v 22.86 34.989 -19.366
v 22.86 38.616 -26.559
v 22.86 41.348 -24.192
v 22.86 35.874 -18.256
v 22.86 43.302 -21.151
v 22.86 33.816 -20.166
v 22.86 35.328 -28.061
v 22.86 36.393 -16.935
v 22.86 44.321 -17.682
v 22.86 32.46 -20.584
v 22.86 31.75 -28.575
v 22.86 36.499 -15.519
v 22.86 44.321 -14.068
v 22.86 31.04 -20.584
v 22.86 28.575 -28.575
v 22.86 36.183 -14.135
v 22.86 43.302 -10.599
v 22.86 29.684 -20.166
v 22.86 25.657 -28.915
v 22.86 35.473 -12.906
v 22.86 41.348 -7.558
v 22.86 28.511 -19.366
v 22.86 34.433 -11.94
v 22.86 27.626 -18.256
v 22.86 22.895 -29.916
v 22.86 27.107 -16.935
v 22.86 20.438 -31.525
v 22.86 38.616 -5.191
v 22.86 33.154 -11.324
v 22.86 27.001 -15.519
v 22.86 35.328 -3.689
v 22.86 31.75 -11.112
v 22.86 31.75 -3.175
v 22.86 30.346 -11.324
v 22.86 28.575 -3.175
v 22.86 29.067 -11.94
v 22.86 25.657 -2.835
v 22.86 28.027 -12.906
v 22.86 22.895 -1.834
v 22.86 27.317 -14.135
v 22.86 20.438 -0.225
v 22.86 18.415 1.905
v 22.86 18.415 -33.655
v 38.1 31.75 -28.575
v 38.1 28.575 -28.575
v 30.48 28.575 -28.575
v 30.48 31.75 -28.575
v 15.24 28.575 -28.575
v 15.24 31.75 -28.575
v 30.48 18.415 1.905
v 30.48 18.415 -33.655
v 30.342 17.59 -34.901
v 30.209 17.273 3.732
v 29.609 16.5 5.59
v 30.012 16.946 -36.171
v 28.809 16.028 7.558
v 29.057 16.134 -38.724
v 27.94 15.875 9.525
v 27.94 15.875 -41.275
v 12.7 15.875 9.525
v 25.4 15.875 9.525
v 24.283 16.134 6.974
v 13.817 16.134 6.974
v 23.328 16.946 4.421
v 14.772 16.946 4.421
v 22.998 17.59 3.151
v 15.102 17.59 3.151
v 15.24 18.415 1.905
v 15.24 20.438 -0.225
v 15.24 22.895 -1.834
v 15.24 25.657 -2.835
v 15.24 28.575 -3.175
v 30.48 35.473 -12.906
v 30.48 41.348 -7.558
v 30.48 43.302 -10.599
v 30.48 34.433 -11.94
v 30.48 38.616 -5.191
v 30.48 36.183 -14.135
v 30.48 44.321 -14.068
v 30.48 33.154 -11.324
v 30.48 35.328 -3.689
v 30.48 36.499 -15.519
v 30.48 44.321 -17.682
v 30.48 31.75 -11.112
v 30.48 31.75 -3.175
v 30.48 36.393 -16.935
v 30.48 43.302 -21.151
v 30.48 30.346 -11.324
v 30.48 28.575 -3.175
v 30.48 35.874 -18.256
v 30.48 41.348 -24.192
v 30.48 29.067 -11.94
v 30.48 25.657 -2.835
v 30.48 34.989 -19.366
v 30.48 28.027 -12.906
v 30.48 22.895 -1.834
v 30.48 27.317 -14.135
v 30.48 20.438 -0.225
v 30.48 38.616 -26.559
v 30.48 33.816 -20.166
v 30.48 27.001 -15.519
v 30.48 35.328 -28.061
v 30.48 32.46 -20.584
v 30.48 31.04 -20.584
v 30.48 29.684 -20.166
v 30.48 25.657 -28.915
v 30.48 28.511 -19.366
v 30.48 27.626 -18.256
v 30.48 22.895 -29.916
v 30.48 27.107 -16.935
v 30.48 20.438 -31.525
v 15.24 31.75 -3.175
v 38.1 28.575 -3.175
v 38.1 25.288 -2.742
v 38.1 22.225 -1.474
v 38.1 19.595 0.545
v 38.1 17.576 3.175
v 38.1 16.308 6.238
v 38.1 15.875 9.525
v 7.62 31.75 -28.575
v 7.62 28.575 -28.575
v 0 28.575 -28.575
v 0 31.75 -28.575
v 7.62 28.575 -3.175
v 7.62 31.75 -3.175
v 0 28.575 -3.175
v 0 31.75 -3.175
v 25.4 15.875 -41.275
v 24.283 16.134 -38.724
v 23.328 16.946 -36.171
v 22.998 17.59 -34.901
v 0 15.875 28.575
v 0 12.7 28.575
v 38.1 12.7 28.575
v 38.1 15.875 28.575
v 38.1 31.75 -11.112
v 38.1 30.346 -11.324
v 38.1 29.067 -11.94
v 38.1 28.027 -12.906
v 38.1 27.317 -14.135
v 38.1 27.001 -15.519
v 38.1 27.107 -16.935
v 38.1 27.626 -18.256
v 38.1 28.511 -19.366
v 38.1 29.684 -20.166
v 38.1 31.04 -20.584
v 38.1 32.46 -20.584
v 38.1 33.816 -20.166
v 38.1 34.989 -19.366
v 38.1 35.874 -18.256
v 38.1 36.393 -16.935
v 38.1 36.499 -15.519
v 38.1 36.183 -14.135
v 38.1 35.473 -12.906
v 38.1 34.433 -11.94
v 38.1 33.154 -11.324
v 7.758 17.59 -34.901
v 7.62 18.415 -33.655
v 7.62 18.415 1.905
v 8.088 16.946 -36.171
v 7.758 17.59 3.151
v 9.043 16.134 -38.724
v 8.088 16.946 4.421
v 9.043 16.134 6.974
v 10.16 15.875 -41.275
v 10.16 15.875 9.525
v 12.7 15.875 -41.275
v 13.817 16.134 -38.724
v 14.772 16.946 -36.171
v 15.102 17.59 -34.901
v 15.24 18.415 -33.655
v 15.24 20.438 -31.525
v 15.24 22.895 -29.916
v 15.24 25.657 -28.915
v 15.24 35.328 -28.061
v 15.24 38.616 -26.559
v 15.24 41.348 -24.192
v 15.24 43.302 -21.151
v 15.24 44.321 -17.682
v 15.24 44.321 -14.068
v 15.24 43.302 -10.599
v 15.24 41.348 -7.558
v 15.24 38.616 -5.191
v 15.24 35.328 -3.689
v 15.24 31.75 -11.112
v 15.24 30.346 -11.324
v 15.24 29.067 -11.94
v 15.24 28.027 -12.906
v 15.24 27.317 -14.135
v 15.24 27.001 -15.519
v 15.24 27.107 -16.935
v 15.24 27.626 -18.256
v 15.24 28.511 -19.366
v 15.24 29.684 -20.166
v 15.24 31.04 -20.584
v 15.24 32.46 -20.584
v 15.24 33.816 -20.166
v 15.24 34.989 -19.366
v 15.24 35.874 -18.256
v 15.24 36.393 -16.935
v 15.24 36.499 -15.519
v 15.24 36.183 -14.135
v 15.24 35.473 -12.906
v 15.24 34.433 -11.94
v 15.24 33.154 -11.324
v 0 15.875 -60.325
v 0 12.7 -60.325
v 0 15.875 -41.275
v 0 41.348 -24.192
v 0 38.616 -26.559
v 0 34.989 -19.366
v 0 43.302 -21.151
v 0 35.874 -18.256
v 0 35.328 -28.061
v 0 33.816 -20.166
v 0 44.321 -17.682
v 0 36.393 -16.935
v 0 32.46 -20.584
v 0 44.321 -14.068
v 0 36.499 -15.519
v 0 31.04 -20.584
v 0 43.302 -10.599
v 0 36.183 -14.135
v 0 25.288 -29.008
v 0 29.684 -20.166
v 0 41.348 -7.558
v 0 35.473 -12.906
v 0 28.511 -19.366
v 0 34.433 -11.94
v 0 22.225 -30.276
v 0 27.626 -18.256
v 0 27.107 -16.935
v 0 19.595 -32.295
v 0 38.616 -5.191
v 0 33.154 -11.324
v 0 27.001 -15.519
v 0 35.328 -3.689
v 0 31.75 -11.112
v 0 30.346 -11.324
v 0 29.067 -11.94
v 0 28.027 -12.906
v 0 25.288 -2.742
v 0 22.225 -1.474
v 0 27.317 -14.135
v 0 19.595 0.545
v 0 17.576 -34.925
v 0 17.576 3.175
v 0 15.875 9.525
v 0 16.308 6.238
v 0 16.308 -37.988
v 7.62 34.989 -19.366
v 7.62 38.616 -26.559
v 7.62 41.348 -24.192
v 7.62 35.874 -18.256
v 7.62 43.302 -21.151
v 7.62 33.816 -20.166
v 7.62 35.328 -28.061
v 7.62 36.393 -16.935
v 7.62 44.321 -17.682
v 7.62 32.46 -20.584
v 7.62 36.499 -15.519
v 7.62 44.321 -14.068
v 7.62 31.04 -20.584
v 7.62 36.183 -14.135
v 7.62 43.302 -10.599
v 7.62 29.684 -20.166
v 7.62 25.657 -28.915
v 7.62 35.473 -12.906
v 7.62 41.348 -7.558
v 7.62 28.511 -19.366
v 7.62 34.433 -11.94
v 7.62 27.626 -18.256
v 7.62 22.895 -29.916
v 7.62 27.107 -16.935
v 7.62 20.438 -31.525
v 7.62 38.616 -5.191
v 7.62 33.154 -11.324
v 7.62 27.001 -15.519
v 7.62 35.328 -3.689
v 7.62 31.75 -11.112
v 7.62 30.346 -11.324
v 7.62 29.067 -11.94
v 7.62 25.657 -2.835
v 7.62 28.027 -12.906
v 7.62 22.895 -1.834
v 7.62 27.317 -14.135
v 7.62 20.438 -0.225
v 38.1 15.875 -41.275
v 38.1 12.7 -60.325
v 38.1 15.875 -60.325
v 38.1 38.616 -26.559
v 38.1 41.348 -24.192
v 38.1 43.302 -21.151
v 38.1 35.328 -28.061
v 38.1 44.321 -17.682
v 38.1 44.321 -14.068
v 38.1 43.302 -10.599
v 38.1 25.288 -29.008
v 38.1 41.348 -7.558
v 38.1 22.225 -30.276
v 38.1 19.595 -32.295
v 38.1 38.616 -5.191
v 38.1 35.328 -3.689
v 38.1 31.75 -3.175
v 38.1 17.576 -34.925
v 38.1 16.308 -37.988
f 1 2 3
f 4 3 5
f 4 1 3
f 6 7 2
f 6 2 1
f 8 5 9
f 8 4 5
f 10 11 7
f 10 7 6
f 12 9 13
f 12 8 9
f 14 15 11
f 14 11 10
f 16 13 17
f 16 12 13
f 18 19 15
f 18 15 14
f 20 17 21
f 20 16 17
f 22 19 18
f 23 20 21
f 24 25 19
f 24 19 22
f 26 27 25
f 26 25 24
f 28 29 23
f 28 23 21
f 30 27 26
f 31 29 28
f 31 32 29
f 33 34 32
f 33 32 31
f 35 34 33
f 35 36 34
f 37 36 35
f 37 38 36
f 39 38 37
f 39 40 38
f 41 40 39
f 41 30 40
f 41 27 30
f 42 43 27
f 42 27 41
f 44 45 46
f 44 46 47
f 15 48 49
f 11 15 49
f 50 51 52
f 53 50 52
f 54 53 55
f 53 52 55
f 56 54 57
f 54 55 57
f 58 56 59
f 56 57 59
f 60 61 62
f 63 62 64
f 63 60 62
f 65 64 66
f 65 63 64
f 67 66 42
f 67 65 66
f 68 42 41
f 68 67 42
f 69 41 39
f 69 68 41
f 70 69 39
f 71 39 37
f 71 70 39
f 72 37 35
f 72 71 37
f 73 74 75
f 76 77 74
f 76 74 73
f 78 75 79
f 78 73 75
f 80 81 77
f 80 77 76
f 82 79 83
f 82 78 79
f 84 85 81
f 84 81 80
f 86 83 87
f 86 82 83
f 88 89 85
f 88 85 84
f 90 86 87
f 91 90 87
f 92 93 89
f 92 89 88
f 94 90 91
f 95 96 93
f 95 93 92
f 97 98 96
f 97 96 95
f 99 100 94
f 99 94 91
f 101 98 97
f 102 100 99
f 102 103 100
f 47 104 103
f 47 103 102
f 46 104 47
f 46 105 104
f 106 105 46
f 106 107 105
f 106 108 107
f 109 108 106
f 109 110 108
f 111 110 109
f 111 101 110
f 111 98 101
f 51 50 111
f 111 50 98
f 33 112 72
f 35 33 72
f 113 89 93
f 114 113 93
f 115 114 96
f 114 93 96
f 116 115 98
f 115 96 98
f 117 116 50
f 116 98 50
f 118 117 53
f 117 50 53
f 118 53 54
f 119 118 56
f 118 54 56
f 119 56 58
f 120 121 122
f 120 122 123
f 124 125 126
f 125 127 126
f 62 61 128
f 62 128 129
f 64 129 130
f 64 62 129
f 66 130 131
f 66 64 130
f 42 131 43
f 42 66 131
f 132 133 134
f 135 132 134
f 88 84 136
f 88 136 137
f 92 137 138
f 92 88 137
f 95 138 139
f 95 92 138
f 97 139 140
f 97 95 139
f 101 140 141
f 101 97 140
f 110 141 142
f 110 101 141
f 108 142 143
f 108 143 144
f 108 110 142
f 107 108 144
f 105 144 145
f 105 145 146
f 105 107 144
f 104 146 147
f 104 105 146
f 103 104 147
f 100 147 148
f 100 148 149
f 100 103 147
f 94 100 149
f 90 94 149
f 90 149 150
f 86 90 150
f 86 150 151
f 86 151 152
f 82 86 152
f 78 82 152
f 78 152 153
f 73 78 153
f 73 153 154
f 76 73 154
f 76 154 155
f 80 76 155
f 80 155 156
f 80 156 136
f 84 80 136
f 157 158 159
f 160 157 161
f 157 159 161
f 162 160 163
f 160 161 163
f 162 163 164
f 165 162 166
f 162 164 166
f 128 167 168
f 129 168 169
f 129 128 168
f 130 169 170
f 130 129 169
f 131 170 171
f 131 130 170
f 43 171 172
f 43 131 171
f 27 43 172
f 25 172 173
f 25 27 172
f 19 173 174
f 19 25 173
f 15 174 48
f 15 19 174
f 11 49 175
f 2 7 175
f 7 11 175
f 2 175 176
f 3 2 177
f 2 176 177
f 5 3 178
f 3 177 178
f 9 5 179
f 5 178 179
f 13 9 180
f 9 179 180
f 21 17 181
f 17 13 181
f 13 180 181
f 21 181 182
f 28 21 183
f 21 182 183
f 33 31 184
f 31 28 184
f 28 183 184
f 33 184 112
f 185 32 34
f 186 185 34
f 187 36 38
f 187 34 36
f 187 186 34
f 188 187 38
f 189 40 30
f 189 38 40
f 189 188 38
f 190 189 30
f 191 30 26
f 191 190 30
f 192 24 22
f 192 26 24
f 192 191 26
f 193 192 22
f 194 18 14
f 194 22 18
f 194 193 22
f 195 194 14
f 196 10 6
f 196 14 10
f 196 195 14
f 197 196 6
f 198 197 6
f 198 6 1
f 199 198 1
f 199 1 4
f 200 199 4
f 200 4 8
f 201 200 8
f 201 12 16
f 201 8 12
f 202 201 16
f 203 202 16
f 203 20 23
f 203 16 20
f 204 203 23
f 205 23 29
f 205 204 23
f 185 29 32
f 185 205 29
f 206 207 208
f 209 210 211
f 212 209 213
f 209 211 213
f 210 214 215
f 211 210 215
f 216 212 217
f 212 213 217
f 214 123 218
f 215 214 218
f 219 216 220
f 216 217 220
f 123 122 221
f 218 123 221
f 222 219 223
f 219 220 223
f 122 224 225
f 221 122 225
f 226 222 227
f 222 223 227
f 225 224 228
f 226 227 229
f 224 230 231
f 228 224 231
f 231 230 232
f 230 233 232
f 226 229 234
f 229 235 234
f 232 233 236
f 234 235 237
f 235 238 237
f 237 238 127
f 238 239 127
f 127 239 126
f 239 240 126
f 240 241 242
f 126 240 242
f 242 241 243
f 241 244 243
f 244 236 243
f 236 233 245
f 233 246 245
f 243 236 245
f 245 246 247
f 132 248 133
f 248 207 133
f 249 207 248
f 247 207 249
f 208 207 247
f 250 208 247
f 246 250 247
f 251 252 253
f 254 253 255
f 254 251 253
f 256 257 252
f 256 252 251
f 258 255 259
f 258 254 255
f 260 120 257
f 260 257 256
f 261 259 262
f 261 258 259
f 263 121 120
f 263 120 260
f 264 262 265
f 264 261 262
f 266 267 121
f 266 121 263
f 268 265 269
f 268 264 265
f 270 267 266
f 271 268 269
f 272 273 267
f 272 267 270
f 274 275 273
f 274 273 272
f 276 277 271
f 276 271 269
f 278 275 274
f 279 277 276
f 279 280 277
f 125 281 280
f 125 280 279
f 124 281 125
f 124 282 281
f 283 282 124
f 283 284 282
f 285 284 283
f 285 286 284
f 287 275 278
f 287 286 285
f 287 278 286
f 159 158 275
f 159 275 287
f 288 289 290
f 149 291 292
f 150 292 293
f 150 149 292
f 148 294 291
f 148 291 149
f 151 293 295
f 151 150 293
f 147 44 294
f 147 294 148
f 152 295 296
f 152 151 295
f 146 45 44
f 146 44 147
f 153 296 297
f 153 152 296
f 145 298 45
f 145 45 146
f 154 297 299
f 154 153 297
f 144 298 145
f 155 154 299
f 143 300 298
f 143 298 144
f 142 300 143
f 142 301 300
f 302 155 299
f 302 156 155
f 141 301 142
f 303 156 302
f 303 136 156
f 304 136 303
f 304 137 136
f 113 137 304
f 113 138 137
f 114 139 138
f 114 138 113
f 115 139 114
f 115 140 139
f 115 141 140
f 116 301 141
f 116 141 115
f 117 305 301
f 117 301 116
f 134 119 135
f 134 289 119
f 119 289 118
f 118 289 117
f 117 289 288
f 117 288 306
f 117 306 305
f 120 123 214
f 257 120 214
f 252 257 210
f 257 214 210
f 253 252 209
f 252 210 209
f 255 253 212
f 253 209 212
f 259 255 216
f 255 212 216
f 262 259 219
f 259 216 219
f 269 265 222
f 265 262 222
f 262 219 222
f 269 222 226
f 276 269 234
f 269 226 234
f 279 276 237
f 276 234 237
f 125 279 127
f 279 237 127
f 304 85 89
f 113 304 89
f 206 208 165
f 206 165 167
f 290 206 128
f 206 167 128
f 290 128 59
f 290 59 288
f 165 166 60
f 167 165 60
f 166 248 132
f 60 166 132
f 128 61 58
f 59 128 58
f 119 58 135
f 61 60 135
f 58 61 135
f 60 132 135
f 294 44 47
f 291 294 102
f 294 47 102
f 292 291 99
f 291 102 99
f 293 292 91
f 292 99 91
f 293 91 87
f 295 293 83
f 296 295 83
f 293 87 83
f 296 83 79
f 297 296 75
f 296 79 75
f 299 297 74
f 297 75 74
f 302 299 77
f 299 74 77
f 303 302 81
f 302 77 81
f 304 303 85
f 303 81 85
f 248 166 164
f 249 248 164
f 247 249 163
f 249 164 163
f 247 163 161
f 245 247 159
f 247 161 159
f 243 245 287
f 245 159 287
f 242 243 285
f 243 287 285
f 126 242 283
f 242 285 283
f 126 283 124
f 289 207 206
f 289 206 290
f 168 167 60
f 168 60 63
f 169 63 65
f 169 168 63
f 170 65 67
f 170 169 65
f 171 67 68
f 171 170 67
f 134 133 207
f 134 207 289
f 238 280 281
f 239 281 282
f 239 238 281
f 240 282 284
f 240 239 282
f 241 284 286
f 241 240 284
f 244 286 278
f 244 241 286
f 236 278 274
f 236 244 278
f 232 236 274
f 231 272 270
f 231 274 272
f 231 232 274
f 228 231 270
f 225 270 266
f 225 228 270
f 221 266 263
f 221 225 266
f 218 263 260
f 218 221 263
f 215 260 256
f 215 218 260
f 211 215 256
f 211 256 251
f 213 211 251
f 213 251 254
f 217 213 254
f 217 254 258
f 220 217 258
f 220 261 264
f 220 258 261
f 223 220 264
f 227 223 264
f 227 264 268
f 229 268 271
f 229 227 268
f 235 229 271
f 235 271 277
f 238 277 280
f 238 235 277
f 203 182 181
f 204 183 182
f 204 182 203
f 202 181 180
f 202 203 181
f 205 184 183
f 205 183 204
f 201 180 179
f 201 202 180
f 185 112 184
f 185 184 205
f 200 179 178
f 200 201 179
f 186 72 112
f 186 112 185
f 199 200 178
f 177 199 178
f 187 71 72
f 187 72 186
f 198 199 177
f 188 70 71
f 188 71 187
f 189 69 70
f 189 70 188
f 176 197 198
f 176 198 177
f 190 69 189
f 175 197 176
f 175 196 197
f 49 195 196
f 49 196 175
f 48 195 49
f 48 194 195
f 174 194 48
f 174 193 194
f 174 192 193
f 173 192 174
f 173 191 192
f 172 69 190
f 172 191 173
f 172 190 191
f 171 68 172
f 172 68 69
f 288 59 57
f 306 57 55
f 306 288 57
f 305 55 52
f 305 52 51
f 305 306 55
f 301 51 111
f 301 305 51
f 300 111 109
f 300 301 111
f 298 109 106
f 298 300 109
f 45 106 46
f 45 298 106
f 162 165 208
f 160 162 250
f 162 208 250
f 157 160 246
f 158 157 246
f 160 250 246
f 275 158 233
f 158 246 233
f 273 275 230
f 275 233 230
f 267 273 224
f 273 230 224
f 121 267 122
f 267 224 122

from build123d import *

# Parameters (mm, degrees)
SKETCH1_R           = 4.762500000000008
BOSS_EXTRUDE1_DEPTH = 38.1
SKETCH3_W           = 3.1750000000000043
SKETCH3_H           = 31.750000000000004
CUT_EXTRUDE1_DEPTH  = 12.7
SKETCH4_W           = 7.62
SKETCH4_H           = 6.350000000000001
SKETCH4_W_2         = 7.619999999999997
CUT_EXTRUDE2_DEPTH  = 60.05841387981902
SKETCH6_W           = 31.749999999999986
SKETCH6_H           = 31.750000000000004
CUT_EXTRUDE3_DEPTH  = 12.7
SKETCH7_W           = 38.1
SKETCH7_H           = 88.89999999999999
BOSS_EXTRUDE2_DEPTH = 3.175
FILLET1_R           = 2.54
FILLET2_R           = 12.7


with BuildPart() as part:
    # Sketch1 → Boss-Extrude1 (new body)
    # profile 1 of 3: a face of its own
    with BuildSketch(Plane(origin=(0, 0, 0), x_dir=(0, 0, -1), z_dir=(1, 0, 0))):
        Polygon((0, 0), (31.75, 3.89e-15), (31.749999999999993, 12.700000000000003), (0, 12.7), align=None)
    # profile 2 of 3: a face of its own
    with BuildSketch(Plane(origin=(0, 0, 0), x_dir=(0, 0, -1), z_dir=(1, 0, 0))):
        Polygon((28.575000000000003, 15.875000000000004), (3.1749999999999963, 15.875), (-3.1750000000000034, 15.875), (-3.1750000000000034, 12.7), (0, 12.7), (31.749999999999993, 12.700000000000003), (34.925, 12.700000000000005), (34.925, 15.875000000000004), align=None)
    # profile 3 of 3: a face of its own
    with BuildSketch(Plane(origin=(0, 0, 0), x_dir=(0, 0, -1), z_dir=(1, 0, 0))):
        with BuildLine():
            ThreePointArc((28.574999999999996, 31.75), (15.874999999999991, 44.45), (3.17499999999999, 31.749999999999996))
            Line((3.1749999999999936, 31.75), (3.174999999999996, 15.875))
            Line((3.1749999999999963, 15.875), (28.575000000000003, 15.875000000000004))
            Line((28.575, 15.875000000000004), (28.574999999999996, 31.75))
        make_face()
        with Locations(Location((15.874999999999996, 31.75, 0), (0, 0, 180))):
            Circle(SKETCH1_R, mode=Mode.SUBTRACT)
    extrude(amount=BOSS_EXTRUDE1_DEPTH)

    # Sketch3 → Cut-Extrude1 (cut)
    with BuildSketch(Plane.XZ):
        with Locations((1.5875000000000021, -15.875000000000002)):
            Rectangle(SKETCH3_W, SKETCH3_H)
        Polygon((34.92499999999999, 0), (34.92499999999999, -31.749999999999993), (38.1, -31.75), (38.1, 0), align=None)
    extrude(amount=-CUT_EXTRUDE1_DEPTH, mode=Mode.SUBTRACT)

    # Sketch4 → Cut-Extrude2 (cut, through all)
    with BuildSketch(Plane(origin=(0, 15.875, 1.45e-15), x_dir=(1, 0, 0), z_dir=(0, 1, 9e-17))):
        Polygon((15.240000000000002, 28.574999999999996), (7.620000000000001, 28.574999999999996), (7.620000000000005, -3.1750000000000043), (15.240000000000007, -3.175000000000002), align=None)
        Polygon((30.48, 28.574999999999996), (22.860000000000003, 28.574999999999996), (22.860000000000007, -3.1750000000000043), (30.480000000000008, -3.175000000000002), align=None)
        with Locations((11.43, 31.749999999999996)):
            Rectangle(SKETCH4_W, SKETCH4_H)
        with Locations((26.67, 31.749999999999996)):
            Rectangle(SKETCH4_W_2, SKETCH4_H)
    extrude(amount=CUT_EXTRUDE2_DEPTH, mode=Mode.SUBTRACT)

    # Sketch6 → Cut-Extrude3 (cut)
    with BuildSketch(Plane.XZ):
        with Locations((19.049999999999997, -15.875000000000002)):
            Rectangle(SKETCH6_W, SKETCH6_H)
    extrude(amount=-CUT_EXTRUDE3_DEPTH, mode=Mode.SUBTRACT)

    # Sketch7 → Boss-Extrude2 (add)
    with BuildSketch(Plane.XZ.offset(-12.7)):
        with Locations((19.05, -15.875)):
            Rectangle(SKETCH7_W, SKETCH7_H)
    extrude(amount=-BOSS_EXTRUDE2_DEPTH)

    # Fillet1
    fillet1_edges = [part.edges().sort_by_distance(p)[0] for p in [
        (30.480000000000004, 15.875000000000002, -15.875),
        (22.860000000000003, 15.875000000000002, -15.875),
        (15.240000000000004, 15.875000000000002, -15.875),
        (7.620000000000003, 15.875000000000002, -15.875),
    ]]
    fillet(fillet1_edges, radius=FILLET1_R)

    # Fillet2
    fillet2_edges = [part.edges().sort_by_distance(p)[0] for p in [
        (33.02, 15.875, -3.1749999999999963),
    ]]
    fillet(fillet2_edges, radius=FILLET2_R)
    fillet2_2_edges = [part.edges().sort_by_distance(p)[0] for p in [
        (5.080000000000002, 15.875, -3.1749999999999963),
    ]]
    fillet(fillet2_2_edges, radius=FILLET2_R)
    fillet2_3_edges = [part.edges().sort_by_distance(p)[0] for p in [
        (5.08, 15.875000000000004, -28.575000000000003),
    ]]
    fillet(fillet2_3_edges, radius=FILLET2_R)
    fillet2_4_edges = [part.edges().sort_by_distance(p)[0] for p in [
        (33.02, 15.875000000000004, -28.575000000000003),
    ]]
    fillet(fillet2_4_edges, radius=FILLET2_R)
    fillet2_5_edges = [part.edges().sort_by_distance(p)[0] for p in [
        (19.050000000000008, 15.875, -3.174999999999996),
    ]]
    fillet(fillet2_5_edges, radius=FILLET2_R)
    fillet2_6_edges = [part.edges().sort_by_distance(p)[0] for p in [
        (19.050000000000004, 15.875000000000002, -28.575),
    ]]
    fillet(fillet2_6_edges, radius=FILLET2_R)


solid = part.part
